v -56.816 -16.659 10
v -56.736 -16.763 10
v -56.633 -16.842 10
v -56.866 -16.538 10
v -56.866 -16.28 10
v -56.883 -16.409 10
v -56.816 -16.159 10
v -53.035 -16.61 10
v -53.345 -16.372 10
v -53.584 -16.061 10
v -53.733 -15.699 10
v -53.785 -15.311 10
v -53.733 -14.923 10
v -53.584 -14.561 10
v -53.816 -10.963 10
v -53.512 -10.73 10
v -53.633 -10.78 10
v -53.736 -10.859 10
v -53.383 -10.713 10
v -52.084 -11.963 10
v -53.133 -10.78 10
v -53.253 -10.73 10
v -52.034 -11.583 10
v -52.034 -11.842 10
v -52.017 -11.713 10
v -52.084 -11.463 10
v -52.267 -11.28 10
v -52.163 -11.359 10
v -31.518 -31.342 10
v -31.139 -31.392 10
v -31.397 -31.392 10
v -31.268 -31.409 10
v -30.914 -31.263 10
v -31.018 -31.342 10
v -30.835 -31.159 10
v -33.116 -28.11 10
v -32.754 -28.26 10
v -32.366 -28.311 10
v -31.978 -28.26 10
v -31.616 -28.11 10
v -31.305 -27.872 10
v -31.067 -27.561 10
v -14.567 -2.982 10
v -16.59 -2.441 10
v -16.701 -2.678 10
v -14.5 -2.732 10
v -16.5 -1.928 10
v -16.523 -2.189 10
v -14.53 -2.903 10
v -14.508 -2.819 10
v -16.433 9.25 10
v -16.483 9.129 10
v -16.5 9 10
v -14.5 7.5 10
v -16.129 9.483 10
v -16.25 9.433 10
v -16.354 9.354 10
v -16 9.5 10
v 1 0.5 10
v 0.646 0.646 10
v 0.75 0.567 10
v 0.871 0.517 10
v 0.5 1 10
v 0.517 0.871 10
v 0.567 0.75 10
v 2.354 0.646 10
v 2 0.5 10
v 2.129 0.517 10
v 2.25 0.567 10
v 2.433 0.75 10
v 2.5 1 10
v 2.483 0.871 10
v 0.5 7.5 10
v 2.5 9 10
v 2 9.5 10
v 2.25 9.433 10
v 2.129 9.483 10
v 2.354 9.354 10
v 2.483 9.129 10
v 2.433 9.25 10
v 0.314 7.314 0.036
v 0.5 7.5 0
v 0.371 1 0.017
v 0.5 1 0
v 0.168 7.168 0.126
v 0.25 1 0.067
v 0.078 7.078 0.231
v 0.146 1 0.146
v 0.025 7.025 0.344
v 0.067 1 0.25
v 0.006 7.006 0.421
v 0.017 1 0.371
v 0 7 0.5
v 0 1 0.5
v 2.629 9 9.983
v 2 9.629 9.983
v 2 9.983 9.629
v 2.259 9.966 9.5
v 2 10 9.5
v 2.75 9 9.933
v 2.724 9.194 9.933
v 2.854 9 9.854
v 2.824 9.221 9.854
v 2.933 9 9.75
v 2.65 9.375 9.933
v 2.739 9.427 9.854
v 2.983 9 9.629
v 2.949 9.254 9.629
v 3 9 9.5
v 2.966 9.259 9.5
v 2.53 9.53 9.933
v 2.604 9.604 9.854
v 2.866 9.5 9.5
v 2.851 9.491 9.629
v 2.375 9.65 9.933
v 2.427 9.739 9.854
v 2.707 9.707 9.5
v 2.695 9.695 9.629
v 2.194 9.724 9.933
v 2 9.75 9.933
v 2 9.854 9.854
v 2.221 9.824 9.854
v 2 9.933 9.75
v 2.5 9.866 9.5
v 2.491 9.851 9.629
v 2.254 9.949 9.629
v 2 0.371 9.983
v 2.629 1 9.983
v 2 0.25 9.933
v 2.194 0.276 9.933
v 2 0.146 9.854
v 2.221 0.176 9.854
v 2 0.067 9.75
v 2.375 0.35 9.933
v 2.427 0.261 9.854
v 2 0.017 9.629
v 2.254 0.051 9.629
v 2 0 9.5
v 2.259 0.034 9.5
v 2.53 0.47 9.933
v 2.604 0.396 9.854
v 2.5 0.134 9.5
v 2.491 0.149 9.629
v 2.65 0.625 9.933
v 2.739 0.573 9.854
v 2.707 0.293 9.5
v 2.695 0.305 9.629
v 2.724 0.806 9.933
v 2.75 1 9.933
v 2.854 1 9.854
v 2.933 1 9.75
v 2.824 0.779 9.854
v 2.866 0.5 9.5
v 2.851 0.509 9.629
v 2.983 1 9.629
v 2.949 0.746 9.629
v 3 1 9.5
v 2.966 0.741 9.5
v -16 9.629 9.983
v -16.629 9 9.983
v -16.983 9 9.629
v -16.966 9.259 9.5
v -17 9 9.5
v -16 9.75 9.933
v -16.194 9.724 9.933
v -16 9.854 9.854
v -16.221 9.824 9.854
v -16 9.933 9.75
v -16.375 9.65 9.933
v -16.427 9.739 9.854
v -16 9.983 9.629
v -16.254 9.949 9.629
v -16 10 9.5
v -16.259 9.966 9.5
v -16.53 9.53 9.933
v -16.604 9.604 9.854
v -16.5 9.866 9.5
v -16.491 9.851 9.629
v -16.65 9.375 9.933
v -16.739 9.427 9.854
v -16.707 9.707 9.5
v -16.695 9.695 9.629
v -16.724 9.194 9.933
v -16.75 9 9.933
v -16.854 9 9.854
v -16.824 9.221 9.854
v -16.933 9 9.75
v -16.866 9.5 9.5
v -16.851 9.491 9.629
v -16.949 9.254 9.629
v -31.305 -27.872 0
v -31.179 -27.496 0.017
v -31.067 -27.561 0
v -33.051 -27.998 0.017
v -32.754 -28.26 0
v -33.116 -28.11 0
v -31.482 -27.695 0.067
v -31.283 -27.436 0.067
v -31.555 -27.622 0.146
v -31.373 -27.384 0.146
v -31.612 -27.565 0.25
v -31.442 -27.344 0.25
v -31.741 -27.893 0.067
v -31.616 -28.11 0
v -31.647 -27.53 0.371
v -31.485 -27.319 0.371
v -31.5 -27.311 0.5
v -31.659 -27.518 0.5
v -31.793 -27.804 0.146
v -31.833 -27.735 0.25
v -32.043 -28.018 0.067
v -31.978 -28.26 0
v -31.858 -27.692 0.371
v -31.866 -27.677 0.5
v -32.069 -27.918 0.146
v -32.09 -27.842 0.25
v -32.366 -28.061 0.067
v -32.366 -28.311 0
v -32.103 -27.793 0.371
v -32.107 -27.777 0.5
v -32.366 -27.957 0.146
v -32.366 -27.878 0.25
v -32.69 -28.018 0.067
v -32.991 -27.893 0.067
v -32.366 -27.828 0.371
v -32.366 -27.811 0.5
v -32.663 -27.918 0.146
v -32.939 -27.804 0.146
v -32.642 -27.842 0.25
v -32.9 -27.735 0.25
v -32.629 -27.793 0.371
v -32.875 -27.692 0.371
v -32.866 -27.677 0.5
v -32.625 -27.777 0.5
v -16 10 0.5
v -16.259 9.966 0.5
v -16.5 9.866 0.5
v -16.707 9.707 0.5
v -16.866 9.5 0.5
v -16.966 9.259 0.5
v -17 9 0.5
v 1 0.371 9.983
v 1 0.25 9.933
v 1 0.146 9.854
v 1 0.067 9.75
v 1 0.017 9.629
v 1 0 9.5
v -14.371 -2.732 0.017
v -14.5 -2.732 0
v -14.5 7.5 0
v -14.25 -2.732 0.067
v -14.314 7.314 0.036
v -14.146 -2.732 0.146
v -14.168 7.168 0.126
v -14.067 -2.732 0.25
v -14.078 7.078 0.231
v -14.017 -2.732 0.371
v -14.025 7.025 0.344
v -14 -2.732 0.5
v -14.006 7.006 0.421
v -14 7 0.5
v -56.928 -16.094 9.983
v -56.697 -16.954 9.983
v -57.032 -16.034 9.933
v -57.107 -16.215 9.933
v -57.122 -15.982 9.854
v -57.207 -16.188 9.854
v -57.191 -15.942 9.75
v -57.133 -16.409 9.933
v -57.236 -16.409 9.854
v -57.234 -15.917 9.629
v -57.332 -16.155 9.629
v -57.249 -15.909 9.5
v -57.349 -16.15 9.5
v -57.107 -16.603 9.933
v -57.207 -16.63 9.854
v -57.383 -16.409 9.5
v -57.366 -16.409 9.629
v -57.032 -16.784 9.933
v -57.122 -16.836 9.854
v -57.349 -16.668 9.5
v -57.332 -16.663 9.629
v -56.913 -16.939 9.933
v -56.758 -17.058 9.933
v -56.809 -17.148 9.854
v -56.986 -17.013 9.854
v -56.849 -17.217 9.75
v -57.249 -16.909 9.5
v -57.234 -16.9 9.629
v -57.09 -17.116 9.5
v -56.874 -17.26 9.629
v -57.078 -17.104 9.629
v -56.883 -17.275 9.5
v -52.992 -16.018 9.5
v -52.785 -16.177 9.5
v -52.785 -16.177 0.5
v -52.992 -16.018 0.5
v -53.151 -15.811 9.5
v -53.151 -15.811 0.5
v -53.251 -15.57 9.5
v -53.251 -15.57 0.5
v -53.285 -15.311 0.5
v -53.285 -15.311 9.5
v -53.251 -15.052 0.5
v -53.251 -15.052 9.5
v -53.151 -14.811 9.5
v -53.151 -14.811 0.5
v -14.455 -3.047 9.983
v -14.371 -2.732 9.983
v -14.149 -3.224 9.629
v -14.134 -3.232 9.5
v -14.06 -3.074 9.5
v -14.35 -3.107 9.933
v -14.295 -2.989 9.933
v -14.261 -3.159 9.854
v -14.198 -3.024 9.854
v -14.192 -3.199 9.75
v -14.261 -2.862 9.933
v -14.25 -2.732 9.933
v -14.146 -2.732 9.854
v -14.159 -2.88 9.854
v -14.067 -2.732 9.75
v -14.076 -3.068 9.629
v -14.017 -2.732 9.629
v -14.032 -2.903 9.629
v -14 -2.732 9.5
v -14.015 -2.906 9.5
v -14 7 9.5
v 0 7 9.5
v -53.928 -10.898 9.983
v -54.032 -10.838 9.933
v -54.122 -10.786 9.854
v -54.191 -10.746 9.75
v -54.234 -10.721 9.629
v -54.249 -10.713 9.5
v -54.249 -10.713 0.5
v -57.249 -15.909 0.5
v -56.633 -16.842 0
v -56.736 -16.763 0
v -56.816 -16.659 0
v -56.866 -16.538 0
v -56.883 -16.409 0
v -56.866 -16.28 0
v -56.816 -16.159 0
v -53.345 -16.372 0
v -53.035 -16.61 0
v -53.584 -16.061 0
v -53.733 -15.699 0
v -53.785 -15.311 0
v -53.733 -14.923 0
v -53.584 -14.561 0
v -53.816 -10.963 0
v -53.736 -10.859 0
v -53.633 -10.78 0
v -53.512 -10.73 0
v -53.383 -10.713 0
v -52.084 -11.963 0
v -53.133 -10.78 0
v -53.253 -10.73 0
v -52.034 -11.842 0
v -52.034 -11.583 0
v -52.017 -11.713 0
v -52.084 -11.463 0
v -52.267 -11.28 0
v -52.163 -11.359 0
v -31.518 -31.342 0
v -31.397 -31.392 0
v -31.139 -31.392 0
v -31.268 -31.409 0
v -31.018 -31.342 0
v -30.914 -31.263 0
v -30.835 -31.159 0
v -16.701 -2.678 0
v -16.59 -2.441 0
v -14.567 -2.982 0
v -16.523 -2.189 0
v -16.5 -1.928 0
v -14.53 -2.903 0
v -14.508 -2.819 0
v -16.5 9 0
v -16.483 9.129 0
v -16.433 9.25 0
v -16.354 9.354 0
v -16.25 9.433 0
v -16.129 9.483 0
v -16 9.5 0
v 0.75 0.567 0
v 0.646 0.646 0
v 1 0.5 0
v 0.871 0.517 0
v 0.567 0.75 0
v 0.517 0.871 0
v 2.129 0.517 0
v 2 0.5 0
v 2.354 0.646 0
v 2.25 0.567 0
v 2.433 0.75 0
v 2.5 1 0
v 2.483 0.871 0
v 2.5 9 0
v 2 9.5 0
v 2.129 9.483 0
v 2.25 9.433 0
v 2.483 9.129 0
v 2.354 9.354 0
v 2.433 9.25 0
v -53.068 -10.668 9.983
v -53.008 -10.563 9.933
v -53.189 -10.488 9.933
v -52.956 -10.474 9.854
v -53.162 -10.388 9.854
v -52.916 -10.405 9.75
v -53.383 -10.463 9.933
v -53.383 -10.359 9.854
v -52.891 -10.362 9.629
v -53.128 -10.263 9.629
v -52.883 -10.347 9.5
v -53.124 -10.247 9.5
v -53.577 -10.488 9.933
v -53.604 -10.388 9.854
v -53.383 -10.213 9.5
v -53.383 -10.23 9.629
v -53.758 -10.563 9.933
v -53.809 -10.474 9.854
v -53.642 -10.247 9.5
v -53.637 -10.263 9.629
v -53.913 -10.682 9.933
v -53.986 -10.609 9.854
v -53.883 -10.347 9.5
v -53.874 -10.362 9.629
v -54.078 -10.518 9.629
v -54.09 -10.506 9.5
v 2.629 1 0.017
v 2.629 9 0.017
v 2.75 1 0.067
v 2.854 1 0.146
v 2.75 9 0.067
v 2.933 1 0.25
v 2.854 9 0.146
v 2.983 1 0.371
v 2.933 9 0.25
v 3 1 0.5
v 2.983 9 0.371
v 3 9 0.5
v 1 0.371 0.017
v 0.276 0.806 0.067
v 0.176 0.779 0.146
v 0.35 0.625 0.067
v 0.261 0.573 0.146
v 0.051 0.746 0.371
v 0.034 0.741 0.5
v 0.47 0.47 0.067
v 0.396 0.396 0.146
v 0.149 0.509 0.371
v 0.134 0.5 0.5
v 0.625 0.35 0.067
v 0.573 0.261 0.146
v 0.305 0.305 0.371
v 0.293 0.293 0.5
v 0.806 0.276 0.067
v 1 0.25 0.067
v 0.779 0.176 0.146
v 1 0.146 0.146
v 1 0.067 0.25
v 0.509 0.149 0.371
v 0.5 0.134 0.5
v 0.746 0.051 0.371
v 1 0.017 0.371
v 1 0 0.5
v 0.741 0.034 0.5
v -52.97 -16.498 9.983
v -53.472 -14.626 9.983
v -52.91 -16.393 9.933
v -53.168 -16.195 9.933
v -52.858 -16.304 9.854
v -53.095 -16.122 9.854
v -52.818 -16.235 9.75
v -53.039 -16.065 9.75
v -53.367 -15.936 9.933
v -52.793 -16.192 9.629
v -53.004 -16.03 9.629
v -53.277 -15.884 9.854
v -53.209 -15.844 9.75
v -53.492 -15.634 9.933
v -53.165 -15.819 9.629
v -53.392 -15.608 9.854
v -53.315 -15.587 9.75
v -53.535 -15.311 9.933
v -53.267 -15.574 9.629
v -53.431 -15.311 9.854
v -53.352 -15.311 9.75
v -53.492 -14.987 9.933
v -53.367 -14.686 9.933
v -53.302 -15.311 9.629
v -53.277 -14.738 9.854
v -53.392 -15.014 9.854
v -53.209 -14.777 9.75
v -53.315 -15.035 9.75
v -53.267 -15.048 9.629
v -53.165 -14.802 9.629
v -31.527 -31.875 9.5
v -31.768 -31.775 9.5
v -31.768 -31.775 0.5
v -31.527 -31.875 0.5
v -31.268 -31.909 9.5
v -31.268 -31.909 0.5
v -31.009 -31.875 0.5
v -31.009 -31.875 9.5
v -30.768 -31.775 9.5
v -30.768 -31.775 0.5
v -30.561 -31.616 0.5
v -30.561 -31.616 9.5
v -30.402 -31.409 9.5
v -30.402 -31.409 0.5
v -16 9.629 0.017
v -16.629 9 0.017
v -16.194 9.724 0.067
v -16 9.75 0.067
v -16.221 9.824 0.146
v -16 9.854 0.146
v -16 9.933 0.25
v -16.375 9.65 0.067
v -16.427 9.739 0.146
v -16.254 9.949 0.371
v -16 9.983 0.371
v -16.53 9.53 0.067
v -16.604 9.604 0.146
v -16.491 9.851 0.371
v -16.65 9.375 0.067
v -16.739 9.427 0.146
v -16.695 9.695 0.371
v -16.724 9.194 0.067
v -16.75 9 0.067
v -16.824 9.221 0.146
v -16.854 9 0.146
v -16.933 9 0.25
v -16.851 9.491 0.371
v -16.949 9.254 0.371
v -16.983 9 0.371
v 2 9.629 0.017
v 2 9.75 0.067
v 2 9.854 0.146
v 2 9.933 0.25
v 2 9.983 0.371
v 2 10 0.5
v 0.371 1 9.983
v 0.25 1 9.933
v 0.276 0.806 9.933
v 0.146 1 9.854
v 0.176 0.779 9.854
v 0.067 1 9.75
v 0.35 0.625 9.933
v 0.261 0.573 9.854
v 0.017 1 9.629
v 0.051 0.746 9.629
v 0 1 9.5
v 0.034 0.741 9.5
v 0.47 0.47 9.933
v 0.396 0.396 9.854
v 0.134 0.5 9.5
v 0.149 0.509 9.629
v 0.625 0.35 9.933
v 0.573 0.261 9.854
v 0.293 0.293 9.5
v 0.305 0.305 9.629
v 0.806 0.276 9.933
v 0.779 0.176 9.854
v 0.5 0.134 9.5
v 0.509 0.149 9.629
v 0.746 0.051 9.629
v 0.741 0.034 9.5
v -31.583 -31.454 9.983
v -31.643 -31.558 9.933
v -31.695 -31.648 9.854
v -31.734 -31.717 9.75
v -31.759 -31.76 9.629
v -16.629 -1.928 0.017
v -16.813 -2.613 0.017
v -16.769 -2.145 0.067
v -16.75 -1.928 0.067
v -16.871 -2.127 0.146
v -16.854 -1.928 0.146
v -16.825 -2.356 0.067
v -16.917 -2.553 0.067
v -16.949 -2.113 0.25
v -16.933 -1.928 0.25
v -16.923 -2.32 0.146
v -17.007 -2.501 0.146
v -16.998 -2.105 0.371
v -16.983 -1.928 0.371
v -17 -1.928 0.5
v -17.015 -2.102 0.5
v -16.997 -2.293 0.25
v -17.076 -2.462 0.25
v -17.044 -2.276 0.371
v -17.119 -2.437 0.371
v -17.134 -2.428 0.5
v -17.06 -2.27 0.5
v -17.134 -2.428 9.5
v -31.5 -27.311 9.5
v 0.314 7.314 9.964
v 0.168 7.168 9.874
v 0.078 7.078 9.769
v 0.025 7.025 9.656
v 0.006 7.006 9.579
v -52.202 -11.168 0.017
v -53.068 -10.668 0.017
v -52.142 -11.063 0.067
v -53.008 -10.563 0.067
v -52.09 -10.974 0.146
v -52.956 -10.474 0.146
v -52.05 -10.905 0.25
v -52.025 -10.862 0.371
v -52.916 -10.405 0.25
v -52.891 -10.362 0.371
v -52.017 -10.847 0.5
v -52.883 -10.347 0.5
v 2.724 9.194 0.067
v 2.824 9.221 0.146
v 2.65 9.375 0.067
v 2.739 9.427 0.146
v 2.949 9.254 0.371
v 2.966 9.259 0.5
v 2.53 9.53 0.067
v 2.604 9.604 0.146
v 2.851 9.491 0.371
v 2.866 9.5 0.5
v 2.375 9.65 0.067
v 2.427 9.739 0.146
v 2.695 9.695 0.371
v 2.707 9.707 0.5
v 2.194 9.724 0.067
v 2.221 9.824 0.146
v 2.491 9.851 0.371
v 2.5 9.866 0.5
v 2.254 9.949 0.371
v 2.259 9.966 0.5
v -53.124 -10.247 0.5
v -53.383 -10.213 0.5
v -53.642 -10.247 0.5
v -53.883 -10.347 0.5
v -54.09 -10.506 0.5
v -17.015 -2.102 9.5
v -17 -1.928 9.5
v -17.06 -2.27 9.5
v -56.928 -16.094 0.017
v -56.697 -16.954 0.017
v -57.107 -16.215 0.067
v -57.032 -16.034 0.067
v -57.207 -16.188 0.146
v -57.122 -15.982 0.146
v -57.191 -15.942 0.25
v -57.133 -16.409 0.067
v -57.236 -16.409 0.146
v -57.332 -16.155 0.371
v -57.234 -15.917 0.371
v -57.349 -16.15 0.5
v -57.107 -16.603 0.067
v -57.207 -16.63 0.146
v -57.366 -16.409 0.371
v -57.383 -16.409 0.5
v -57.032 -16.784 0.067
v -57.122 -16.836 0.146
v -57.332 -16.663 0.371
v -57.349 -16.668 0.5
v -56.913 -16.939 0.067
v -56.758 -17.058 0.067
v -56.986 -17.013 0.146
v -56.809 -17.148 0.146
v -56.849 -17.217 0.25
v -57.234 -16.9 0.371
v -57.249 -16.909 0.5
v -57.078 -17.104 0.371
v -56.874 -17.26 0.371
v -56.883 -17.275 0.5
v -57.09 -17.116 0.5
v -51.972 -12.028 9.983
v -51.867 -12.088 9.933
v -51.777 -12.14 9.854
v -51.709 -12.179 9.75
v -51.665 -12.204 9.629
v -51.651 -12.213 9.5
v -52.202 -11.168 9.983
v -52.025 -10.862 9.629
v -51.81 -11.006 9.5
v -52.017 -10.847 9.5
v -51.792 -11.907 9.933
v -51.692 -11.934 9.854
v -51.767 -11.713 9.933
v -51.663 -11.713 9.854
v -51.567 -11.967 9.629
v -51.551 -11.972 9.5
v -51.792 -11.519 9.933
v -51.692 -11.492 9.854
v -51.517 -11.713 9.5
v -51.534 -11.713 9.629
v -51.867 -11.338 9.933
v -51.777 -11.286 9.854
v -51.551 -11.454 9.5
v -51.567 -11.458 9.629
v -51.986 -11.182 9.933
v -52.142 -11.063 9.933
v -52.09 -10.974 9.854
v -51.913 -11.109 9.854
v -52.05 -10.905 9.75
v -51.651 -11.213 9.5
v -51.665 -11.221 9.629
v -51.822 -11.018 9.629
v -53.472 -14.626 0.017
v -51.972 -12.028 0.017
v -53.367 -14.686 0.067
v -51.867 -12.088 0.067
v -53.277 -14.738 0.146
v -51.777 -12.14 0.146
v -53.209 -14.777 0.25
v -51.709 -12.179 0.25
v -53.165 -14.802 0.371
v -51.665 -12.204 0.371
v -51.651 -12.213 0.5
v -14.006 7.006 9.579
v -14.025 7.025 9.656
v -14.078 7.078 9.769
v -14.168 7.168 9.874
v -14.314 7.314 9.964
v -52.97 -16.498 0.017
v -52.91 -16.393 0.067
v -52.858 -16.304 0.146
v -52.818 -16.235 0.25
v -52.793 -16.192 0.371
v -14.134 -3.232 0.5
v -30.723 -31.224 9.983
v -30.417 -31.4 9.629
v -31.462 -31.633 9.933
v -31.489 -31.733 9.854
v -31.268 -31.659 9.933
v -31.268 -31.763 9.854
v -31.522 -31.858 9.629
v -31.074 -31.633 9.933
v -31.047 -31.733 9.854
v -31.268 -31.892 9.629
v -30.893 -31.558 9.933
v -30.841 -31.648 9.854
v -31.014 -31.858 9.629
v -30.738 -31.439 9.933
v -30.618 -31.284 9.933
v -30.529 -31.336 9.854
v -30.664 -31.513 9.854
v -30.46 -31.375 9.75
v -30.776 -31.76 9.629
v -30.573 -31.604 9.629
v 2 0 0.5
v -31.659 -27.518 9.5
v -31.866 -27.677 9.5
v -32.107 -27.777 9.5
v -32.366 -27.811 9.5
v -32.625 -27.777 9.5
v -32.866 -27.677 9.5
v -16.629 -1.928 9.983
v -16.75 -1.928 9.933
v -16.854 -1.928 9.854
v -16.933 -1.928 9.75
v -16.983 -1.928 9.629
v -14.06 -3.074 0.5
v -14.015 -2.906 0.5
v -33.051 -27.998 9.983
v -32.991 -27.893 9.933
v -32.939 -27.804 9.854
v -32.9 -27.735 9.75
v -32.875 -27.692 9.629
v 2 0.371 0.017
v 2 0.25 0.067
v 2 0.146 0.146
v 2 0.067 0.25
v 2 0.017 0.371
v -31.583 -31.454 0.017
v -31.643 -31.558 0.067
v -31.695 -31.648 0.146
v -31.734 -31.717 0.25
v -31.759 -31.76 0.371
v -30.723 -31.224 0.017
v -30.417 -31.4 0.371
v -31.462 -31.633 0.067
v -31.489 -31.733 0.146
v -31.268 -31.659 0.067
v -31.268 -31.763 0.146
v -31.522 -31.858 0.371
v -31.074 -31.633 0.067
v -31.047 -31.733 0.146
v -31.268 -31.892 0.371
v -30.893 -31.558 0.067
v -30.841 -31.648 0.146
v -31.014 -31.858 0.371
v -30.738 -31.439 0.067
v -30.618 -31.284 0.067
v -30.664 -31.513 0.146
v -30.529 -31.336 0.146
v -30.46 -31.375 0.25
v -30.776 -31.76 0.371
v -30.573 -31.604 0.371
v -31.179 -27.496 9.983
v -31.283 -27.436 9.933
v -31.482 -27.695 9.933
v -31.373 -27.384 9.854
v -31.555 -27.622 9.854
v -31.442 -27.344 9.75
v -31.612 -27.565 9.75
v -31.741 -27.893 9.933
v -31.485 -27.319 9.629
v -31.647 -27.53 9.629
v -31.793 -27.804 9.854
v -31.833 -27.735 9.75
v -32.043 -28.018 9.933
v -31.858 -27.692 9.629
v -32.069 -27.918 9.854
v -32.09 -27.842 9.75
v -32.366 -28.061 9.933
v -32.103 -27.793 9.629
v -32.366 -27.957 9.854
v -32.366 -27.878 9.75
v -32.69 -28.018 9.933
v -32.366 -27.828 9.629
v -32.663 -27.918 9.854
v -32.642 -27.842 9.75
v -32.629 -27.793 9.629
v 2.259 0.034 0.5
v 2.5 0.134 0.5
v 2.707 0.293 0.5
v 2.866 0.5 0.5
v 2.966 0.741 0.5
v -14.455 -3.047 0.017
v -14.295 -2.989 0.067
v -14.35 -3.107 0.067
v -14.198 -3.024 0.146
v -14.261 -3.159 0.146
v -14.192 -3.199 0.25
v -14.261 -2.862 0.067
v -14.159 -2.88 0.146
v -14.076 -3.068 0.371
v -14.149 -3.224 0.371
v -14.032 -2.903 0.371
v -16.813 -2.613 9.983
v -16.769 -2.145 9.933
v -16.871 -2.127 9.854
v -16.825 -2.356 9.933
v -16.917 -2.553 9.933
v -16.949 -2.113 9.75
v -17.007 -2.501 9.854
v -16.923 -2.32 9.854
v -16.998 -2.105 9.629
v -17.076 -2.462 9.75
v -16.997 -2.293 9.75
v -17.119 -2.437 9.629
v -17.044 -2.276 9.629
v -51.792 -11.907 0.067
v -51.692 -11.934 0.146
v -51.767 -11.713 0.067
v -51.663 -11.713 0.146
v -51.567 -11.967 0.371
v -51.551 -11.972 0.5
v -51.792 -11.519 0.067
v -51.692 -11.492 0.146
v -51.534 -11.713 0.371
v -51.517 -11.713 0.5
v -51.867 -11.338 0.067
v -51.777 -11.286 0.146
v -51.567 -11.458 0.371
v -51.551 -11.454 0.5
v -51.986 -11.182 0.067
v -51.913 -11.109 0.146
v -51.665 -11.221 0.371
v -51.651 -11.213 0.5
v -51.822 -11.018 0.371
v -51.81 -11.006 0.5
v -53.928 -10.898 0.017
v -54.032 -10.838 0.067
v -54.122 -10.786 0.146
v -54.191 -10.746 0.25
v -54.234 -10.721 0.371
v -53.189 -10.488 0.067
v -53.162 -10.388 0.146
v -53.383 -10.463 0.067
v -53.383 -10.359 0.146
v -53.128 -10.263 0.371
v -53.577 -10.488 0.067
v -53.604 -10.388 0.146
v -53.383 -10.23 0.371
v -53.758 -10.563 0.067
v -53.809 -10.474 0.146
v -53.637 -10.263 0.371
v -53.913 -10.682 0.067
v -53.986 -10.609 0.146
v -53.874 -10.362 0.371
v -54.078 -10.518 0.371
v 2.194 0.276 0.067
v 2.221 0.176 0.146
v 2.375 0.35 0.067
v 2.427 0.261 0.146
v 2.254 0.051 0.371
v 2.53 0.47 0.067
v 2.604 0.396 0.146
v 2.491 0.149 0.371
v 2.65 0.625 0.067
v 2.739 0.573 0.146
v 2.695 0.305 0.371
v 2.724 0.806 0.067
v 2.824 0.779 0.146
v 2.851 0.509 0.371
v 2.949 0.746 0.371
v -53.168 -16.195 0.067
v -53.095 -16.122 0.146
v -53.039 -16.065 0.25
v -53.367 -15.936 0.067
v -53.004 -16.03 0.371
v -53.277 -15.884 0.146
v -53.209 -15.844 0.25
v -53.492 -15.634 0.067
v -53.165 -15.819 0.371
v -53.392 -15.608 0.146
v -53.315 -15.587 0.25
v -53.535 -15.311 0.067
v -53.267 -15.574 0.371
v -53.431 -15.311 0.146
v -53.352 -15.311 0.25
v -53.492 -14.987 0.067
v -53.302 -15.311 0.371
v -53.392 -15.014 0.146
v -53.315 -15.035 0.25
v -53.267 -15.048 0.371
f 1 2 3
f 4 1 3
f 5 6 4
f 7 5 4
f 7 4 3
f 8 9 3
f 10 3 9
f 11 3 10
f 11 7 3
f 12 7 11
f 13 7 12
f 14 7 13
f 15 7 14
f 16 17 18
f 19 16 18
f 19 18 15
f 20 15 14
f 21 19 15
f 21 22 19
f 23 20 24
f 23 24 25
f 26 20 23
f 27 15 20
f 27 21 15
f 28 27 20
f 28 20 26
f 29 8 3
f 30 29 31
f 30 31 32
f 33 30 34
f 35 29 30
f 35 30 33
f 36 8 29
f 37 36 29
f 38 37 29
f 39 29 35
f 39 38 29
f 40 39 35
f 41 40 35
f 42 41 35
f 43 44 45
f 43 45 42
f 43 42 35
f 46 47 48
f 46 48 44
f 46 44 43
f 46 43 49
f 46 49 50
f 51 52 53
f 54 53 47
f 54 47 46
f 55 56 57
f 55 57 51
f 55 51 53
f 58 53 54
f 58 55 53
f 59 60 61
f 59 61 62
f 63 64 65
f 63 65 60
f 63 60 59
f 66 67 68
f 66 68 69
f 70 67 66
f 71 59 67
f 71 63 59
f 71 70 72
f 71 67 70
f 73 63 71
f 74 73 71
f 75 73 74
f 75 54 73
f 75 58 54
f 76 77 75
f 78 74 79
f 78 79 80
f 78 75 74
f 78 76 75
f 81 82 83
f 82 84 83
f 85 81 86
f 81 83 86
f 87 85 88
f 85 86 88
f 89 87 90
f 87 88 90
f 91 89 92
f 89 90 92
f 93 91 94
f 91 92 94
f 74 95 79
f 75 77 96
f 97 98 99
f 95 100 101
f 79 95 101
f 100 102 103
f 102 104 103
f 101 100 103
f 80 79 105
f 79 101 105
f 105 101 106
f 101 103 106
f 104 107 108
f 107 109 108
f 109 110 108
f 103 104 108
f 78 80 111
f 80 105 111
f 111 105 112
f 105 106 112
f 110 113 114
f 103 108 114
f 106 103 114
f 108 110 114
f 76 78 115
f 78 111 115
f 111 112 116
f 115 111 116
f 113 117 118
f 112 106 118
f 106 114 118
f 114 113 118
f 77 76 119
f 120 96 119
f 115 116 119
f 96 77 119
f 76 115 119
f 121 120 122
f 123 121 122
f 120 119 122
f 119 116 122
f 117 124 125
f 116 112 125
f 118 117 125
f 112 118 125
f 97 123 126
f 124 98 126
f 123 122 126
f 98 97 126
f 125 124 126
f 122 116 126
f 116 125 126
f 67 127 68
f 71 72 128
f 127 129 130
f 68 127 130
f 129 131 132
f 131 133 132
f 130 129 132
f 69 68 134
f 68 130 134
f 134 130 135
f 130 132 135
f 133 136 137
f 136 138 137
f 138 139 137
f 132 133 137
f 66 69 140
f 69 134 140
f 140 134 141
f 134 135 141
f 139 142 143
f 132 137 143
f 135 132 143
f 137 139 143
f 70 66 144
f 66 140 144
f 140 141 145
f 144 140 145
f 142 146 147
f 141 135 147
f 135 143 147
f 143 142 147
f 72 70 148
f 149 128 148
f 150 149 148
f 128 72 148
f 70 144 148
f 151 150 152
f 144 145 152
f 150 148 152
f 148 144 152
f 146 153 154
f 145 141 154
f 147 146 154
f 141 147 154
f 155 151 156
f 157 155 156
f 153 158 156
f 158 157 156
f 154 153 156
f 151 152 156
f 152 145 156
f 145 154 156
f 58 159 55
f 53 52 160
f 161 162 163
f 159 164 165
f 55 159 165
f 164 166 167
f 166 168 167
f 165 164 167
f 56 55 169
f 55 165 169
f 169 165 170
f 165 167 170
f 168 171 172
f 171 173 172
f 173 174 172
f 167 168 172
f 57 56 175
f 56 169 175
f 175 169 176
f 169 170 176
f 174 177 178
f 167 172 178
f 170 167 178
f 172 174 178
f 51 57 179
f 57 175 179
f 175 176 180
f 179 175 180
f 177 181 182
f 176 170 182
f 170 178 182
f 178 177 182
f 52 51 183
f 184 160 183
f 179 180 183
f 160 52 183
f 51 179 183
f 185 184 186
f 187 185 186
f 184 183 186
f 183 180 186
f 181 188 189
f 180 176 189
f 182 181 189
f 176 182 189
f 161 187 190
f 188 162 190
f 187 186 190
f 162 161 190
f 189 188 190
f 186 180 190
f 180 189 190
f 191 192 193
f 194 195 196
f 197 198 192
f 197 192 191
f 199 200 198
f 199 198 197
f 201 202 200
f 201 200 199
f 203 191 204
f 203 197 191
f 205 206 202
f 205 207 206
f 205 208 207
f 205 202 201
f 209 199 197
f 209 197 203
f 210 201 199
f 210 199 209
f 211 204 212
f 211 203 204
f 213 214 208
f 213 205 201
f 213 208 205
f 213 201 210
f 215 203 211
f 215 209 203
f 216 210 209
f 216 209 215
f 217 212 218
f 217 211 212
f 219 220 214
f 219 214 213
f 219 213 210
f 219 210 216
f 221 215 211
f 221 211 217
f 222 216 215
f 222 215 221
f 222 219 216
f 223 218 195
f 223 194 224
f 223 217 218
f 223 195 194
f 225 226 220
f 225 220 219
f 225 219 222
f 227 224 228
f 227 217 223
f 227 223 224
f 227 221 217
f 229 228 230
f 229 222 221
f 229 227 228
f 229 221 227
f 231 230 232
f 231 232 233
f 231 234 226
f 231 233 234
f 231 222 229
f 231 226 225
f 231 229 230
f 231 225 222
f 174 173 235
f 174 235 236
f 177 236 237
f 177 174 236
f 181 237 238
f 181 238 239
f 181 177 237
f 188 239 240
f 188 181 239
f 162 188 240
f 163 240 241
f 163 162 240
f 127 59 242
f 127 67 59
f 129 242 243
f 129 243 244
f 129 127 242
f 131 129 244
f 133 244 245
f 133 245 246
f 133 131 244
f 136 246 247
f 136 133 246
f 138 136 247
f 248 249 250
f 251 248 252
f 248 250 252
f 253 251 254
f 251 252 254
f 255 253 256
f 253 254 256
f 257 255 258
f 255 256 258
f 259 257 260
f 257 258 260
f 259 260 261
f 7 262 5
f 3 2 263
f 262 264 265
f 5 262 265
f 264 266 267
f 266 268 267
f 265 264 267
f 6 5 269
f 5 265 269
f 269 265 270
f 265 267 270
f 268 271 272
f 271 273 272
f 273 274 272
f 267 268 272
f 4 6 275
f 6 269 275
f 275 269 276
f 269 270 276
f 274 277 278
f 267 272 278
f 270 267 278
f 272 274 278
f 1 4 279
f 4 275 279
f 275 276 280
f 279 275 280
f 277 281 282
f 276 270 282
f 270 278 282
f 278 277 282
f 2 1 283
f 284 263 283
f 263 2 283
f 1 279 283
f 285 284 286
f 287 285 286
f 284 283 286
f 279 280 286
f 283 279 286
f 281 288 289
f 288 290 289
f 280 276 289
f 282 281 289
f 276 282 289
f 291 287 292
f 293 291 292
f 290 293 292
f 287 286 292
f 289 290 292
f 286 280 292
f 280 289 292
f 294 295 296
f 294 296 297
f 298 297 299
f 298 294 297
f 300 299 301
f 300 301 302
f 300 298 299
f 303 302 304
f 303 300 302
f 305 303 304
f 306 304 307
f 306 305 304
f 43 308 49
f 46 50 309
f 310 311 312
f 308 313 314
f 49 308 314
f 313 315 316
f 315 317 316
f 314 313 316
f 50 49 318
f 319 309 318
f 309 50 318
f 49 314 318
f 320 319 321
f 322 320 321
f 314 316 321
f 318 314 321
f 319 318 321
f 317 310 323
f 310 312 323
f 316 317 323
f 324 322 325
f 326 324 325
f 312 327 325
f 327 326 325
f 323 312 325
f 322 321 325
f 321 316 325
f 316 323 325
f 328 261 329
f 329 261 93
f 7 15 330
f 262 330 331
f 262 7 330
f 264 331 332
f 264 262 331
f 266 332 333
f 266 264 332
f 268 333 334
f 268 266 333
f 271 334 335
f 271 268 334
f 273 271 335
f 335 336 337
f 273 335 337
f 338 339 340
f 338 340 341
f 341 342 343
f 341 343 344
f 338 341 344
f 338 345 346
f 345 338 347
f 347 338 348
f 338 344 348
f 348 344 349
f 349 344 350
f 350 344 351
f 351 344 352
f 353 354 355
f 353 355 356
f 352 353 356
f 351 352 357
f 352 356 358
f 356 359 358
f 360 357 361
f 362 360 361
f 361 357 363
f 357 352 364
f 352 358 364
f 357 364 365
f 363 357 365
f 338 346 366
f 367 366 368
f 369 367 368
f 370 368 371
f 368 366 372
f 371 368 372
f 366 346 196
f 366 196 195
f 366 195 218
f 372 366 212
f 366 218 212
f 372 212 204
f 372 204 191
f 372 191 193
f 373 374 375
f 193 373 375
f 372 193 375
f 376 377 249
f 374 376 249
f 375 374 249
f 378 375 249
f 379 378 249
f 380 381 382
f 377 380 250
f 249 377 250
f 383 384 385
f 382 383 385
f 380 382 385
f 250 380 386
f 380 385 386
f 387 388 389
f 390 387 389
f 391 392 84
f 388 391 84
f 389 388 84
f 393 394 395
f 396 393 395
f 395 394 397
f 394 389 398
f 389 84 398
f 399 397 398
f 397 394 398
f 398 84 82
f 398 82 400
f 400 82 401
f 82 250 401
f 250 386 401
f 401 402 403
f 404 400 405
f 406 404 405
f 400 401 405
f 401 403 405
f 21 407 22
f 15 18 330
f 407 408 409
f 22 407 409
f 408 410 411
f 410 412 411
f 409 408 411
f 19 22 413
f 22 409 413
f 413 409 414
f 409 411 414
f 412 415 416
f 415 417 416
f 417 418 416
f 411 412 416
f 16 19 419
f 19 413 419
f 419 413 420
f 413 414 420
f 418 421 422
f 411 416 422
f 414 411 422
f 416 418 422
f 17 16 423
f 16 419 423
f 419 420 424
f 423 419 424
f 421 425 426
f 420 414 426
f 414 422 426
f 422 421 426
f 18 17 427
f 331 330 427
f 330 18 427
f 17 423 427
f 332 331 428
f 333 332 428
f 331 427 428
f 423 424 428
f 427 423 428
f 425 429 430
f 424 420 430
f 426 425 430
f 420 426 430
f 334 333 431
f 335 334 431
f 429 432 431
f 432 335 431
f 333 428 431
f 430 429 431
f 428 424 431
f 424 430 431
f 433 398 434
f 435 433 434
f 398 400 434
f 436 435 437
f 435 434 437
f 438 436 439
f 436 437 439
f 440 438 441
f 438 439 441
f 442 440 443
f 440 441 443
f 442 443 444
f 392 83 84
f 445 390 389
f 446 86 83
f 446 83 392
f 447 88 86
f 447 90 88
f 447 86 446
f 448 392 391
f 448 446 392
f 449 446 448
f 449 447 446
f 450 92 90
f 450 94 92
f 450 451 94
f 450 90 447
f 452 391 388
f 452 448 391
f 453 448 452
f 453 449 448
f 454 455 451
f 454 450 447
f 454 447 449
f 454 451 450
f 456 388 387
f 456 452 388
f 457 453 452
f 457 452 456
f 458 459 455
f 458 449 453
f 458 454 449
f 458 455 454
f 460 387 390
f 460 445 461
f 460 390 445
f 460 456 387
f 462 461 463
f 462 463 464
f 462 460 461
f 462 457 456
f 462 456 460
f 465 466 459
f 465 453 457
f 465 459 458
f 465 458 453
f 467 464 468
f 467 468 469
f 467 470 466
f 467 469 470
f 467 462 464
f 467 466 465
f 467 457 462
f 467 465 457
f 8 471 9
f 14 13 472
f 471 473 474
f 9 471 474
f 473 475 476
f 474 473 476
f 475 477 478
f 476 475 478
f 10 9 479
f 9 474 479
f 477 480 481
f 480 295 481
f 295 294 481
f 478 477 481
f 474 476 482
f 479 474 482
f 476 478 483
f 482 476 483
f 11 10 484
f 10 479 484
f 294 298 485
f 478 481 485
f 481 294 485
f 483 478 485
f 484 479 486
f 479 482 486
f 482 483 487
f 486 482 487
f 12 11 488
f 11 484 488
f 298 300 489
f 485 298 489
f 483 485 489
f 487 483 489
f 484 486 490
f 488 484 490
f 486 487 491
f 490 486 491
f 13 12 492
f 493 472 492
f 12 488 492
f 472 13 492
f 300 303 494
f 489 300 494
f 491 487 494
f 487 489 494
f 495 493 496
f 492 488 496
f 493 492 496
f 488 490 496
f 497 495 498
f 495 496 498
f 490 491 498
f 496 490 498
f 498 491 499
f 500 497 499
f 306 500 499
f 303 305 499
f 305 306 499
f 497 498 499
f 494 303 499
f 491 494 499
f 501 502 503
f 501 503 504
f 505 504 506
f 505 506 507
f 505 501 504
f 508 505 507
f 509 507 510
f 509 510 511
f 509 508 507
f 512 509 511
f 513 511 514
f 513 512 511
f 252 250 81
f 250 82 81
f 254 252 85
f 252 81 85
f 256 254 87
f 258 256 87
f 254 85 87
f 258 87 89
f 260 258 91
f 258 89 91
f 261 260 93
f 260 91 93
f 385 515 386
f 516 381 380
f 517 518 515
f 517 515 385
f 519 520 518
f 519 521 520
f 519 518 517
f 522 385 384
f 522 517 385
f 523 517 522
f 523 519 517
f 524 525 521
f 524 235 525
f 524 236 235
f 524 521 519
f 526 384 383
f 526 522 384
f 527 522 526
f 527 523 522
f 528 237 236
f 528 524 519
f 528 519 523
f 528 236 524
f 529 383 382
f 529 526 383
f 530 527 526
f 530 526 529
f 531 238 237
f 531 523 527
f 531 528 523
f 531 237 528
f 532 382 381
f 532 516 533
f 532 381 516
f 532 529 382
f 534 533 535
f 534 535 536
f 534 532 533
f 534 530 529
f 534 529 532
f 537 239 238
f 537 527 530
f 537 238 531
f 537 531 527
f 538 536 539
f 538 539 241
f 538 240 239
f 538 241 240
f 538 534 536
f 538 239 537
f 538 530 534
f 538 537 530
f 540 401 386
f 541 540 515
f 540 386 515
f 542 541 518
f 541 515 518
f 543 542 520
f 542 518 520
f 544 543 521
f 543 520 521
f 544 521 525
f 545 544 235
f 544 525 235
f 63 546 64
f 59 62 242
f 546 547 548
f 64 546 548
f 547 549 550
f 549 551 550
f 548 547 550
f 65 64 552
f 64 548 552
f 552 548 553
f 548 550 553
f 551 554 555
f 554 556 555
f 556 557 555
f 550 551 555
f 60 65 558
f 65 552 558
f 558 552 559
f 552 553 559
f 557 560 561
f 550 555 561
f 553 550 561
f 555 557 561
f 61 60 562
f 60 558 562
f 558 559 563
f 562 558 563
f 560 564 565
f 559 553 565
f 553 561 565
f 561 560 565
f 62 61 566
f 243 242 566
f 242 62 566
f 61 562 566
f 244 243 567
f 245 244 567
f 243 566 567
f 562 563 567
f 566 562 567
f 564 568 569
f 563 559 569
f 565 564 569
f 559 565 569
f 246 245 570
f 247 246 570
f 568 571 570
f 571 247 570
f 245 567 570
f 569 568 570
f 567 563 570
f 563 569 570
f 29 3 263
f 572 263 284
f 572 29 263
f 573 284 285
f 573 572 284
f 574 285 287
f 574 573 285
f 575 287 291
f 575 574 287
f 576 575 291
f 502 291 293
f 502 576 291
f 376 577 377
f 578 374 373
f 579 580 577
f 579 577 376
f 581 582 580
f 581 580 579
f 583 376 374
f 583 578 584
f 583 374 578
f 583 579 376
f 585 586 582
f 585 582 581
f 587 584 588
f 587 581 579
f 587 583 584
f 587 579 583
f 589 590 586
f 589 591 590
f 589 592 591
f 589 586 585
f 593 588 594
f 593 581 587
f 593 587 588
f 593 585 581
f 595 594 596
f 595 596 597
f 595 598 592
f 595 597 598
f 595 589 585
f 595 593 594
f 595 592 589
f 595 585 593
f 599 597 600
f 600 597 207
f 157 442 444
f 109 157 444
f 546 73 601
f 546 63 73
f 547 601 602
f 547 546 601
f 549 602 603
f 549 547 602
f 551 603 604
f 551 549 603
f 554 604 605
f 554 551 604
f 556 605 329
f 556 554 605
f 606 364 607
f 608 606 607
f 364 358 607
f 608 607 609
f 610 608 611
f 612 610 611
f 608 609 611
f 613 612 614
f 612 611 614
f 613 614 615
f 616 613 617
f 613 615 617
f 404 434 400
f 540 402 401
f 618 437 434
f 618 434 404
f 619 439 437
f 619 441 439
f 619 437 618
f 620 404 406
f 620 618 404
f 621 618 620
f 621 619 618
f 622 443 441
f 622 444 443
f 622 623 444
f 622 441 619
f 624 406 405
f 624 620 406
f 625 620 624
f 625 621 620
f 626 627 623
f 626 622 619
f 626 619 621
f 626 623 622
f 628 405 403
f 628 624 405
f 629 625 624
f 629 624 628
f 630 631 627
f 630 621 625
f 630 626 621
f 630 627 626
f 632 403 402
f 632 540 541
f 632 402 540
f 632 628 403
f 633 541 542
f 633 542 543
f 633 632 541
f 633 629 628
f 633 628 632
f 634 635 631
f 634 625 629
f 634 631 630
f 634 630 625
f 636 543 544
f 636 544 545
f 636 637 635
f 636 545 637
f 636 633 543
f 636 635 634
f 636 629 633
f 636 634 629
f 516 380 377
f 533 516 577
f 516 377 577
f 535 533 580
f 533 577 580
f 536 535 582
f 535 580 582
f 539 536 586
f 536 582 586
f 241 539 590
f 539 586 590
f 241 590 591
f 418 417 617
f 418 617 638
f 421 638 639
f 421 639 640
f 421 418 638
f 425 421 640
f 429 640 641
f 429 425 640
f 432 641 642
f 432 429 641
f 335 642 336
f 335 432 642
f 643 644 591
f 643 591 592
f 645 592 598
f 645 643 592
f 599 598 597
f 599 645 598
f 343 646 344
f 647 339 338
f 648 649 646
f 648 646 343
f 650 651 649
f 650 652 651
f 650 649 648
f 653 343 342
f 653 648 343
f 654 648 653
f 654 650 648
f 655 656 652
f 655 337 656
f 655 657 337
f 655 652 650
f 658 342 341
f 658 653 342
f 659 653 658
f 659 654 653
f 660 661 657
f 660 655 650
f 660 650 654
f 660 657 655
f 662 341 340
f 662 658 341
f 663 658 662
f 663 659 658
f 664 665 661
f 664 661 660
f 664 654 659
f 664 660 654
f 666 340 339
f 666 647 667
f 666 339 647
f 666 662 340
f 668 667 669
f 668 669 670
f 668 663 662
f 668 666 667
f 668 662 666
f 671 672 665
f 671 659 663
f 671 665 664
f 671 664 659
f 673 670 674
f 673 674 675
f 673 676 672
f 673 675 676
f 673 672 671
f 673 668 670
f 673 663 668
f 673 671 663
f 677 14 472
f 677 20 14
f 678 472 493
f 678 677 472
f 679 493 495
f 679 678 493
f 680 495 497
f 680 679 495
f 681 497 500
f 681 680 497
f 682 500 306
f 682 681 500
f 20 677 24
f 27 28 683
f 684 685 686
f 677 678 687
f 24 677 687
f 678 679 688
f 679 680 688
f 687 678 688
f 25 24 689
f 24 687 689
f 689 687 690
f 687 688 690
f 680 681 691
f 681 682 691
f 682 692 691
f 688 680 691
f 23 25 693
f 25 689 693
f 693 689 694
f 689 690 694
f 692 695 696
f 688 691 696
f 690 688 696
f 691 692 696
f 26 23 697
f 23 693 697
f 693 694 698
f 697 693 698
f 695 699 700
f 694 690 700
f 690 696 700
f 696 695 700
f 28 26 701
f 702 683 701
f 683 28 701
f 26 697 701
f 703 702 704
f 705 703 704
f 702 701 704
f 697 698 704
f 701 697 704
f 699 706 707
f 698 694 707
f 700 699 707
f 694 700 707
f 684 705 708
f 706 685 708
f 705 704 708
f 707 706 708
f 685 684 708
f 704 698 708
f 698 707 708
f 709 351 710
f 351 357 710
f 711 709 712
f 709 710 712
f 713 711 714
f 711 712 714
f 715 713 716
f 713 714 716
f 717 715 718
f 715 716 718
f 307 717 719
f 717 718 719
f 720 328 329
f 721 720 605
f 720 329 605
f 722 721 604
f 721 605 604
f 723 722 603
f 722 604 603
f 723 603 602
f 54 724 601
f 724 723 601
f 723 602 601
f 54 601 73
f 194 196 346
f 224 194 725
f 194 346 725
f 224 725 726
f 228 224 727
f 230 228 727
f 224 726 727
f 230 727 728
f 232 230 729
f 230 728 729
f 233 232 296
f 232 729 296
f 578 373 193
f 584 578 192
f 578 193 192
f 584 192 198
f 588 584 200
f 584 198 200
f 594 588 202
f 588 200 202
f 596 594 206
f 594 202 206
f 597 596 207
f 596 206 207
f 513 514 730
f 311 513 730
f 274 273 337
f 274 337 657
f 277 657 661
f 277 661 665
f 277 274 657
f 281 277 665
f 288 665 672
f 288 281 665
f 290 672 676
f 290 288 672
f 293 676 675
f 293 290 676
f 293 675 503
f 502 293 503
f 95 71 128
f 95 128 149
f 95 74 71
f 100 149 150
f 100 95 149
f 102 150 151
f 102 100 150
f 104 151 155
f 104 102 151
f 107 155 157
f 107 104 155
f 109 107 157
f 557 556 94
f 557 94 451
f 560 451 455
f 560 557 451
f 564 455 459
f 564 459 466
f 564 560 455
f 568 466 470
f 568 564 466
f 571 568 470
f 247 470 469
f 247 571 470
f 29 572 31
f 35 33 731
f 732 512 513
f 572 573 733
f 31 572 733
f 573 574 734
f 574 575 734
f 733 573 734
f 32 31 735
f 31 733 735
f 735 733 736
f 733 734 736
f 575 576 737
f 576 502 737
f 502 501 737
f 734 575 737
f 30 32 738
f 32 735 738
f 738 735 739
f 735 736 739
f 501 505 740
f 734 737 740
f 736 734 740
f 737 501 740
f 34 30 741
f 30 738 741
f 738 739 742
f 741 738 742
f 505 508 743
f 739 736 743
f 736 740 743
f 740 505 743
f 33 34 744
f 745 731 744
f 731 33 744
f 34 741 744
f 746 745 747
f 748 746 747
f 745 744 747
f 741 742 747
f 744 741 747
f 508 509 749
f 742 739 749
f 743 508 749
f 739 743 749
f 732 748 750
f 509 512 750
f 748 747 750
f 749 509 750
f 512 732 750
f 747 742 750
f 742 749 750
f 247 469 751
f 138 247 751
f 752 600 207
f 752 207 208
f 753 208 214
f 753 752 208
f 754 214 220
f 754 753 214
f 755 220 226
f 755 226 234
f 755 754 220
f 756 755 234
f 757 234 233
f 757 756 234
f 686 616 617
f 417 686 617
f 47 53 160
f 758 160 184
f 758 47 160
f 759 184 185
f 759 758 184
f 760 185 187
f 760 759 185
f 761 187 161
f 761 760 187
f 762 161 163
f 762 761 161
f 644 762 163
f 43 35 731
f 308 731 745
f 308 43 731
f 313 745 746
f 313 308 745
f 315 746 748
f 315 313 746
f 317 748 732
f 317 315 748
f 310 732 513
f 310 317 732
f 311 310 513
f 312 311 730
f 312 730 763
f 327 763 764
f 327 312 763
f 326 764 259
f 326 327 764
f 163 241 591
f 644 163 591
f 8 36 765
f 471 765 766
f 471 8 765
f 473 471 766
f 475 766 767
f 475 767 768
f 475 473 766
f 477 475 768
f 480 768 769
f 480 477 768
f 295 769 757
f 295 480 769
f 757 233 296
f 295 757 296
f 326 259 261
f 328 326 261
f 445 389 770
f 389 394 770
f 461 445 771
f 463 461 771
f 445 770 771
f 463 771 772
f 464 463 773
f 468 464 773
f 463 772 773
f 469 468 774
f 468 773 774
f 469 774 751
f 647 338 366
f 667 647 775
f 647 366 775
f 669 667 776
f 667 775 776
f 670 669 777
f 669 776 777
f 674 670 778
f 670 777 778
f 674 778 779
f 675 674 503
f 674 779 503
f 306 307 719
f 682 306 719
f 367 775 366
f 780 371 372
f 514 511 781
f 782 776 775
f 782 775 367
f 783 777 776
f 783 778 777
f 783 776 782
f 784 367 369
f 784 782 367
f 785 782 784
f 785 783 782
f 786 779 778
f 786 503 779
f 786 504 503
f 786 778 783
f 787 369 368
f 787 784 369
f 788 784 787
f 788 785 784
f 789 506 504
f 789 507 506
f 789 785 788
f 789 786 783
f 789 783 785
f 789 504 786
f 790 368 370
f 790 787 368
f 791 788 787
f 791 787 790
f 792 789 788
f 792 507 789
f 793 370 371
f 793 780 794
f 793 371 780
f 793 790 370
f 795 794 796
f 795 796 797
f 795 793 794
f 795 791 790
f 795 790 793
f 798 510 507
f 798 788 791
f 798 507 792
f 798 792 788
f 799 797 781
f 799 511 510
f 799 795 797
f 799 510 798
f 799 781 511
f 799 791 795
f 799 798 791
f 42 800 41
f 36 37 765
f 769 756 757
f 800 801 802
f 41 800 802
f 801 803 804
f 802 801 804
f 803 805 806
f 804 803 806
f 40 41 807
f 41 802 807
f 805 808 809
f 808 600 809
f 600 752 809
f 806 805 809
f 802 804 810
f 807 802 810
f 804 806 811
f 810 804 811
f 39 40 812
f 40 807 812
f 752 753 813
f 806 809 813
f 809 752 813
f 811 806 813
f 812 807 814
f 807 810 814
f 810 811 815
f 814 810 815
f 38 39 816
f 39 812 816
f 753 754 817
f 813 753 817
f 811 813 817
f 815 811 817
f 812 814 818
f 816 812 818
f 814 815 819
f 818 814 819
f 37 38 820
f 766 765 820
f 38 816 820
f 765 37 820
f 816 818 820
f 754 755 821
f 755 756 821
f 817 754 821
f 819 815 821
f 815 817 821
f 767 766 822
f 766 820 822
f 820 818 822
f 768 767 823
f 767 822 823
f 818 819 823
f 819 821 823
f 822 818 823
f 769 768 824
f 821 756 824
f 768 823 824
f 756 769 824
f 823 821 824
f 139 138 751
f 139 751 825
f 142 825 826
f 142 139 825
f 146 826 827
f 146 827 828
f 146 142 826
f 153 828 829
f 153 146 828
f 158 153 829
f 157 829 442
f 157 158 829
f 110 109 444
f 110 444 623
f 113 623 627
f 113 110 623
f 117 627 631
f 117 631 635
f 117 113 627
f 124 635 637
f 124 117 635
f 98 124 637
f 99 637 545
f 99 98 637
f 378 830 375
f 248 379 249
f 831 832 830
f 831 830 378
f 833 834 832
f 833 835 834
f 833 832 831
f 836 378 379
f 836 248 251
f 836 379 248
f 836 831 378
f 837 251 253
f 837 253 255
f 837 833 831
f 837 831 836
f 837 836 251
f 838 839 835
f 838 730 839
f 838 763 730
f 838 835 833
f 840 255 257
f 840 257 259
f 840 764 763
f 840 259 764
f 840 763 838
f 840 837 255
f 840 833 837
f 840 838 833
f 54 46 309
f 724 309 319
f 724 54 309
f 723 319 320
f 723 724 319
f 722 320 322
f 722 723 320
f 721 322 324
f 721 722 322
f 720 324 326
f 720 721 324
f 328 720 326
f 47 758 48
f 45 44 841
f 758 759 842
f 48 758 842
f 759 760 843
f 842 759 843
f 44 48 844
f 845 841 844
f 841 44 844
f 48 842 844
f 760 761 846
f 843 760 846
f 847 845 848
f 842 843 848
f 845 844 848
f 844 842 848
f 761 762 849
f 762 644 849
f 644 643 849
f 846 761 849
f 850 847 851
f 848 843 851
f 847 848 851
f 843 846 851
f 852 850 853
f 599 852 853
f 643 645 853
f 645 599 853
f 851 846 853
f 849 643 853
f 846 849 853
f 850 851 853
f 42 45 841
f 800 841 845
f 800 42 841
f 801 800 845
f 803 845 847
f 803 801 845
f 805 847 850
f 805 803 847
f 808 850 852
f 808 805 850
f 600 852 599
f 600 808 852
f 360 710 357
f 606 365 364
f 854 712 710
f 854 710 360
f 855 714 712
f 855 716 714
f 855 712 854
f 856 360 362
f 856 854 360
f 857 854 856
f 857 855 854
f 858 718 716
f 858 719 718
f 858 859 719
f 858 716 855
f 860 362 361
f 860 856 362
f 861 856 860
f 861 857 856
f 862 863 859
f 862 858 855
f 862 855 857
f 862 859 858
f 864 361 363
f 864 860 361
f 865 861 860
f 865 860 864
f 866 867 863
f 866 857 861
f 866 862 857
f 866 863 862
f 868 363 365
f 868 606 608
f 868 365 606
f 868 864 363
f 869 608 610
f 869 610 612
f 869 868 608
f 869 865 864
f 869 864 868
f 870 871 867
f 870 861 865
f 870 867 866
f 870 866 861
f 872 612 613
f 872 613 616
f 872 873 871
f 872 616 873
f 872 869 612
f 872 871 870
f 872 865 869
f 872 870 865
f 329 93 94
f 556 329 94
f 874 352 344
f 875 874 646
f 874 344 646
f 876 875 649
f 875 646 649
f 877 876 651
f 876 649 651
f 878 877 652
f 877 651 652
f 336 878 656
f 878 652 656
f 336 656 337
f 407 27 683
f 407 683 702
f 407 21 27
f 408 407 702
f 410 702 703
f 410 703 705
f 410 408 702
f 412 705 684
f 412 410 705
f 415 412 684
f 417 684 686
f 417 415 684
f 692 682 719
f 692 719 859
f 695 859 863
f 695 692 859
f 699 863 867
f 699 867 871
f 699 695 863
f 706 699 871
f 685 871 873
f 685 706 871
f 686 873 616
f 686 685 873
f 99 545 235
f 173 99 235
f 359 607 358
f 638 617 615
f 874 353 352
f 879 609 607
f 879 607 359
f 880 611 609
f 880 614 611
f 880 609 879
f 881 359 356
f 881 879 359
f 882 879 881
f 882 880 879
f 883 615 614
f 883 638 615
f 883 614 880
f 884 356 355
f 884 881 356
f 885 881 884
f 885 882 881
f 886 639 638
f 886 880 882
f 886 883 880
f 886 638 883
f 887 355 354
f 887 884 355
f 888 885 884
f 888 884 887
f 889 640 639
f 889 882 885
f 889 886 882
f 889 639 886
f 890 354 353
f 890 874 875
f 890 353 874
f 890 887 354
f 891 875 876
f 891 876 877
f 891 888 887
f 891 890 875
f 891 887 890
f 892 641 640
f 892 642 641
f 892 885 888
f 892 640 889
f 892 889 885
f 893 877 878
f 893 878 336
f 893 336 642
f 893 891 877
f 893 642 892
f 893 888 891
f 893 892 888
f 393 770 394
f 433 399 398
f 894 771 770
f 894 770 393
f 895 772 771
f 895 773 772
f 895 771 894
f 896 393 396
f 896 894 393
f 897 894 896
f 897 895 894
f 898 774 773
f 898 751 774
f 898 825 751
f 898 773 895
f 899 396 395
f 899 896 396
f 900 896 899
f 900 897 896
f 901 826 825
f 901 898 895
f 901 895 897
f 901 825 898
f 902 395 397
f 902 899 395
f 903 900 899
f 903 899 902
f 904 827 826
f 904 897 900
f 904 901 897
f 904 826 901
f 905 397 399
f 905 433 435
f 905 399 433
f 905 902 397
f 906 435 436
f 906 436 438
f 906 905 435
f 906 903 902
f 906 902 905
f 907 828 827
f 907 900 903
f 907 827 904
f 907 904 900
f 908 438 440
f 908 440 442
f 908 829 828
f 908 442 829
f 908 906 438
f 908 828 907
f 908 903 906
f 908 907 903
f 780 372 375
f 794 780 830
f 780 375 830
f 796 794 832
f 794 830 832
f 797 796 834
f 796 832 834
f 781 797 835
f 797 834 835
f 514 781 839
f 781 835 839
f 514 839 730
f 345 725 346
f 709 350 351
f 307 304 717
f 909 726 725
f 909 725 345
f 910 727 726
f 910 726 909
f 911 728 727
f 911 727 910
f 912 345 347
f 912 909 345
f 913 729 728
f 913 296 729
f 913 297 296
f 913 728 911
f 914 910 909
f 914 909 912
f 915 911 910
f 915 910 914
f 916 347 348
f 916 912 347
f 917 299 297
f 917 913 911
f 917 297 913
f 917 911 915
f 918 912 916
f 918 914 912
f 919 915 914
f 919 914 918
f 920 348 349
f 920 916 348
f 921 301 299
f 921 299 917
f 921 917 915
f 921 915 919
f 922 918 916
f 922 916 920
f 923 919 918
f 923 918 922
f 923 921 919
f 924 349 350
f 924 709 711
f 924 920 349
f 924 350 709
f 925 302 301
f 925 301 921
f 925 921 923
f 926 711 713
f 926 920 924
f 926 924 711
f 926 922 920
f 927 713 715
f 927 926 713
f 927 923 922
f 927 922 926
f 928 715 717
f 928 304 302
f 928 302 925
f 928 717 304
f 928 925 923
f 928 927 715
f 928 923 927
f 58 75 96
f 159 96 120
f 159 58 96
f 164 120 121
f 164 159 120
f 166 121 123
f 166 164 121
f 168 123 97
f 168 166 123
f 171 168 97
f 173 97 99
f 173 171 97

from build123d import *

# Parameters (mm, degrees)
F1_DEPTH = 10
F2_R     = 1
F3_R     = 0.5


with BuildPart() as f1:
    # F0 (on Top) → F1 (new body)
    with BuildSketch(Plane.XY):
        Polygon((0, 7), (0, 0), (3, 0), (3, 10), (-17, 10), (-17, -2.196152), (-32, -28.176915), (-53.650635, -15.676915), (-51.150635, -11.346788), (-53.748711, -9.846788), (-57.748711, -16.774991), (-30.901924, -32.274991), (-14, -3), (-14, 7), align=None)
    extrude(amount=F1_DEPTH)

    # F2
    f2_edges = [f1.edges().sort_by_distance(p)[0] for p in [
        (-17, 10, 5),
        (3, 10, 5),
        (-17, -2.196152, 5),
        (-14, -3, 5),
        (3, 0, 5),
        (0, 0, 5),
        (-30.901924, -32.274991, 5),
        (-32, -28.176915, 5),
        (-53.650635, -15.676915, 5),
        (-51.150635, -11.346788, 5),
        (-53.748711, -9.846788, 5),
        (-57.748711, -16.774991, 5),
    ]]
    fillet(f2_edges, radius=F2_R)

    # F3
    f3_edges = [f1.edges().sort_by_distance(p)[0] for p in [
        (-22.267949, -17.320508, 10),
        (-7, 7, 10),
        (-22.267949, -17.320508, 0),
        (-7, 7, 0),
    ]]
    fillet(f3_edges, radius=F3_R)


solid = f1.part
